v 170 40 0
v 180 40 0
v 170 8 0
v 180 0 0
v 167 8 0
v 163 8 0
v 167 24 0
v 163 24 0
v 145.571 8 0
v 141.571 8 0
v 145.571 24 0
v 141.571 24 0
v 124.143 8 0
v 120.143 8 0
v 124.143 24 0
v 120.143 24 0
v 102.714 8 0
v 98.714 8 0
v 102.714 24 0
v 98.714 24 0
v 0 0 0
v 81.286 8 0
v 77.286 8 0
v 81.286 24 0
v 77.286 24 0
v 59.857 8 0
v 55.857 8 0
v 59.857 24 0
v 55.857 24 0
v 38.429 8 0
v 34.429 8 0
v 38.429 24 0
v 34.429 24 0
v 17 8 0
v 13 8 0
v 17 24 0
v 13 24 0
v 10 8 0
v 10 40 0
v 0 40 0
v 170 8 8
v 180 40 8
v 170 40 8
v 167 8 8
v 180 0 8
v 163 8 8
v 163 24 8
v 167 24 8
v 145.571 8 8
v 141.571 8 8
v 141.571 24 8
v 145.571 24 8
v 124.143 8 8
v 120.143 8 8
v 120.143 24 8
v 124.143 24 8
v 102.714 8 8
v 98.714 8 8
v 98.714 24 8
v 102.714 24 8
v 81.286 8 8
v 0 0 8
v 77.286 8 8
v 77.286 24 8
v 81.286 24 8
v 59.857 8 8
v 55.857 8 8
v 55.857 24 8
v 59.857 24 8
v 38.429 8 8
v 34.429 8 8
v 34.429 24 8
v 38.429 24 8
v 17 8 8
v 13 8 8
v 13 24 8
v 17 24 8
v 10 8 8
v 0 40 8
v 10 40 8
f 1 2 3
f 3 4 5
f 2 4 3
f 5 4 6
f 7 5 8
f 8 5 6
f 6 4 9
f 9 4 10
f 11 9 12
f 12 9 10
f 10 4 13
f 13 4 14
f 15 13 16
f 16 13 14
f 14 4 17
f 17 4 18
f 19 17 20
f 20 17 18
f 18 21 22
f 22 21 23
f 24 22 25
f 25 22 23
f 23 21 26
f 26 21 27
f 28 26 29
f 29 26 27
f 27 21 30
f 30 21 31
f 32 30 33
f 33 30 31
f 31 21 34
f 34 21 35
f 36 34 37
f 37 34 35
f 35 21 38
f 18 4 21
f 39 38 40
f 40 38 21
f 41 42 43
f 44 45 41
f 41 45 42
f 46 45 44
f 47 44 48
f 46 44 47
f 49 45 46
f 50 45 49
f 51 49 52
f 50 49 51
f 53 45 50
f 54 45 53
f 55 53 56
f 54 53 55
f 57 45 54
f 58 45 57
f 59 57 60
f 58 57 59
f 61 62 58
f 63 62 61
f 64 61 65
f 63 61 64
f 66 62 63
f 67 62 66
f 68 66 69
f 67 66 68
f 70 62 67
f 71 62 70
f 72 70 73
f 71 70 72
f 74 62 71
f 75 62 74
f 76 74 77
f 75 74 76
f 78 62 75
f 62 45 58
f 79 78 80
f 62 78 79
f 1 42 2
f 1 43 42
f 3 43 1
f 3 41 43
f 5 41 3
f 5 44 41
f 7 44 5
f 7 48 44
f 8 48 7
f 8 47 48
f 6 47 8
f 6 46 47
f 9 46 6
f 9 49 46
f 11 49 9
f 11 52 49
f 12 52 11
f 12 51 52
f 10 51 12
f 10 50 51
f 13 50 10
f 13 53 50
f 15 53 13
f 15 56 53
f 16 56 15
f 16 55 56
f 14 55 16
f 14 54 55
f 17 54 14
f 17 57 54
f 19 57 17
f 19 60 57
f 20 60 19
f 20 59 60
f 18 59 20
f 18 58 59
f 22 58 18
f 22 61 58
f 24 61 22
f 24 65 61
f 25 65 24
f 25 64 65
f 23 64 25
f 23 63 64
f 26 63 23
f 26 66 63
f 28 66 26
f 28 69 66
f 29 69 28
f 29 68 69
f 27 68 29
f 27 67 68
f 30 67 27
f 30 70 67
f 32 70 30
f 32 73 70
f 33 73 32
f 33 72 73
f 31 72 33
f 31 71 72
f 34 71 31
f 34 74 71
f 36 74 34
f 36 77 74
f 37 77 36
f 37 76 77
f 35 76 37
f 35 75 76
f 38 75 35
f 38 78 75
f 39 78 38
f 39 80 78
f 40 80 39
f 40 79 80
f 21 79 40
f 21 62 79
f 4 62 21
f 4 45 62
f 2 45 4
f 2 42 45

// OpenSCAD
$fn = 32;

// ----------------------------------------------------------------------
// Guard grille: 8 slats over a 180 x 40 mm plate
// ----------------------------------------------------------------------

// --- parameters (mm) ---
profile_height = 8;       // extrusion height
profile_points = 40;      // points of the closed outline

profile = [[0, 0], [180, 0], [180, 40], [170, 40], [170, 8], [167, 8], [167, 24], [163, 24], [163, 8], [145.571, 8], [145.571, 24], [141.571, 24], [141.571, 8], [124.143, 8], [124.143, 24], [120.143, 24], [120.143, 8], [102.714, 8], [102.714, 24], [98.714, 24], [98.714, 8], [81.286, 8], [81.286, 24], [77.286, 24], [77.286, 8], [59.857, 8], [59.857, 24], [55.857, 24], [55.857, 8], [38.429, 8], [38.429, 24], [34.429, 24], [34.429, 8], [17, 8], [17, 24], [13, 24], [13, 8], [10, 8], [10, 40], [0, 40]];  // single closed polygon, 40 points, counter clockwise

// --- the one profile operation ---
linear_extrude(height = profile_height) polygon(points = profile);
